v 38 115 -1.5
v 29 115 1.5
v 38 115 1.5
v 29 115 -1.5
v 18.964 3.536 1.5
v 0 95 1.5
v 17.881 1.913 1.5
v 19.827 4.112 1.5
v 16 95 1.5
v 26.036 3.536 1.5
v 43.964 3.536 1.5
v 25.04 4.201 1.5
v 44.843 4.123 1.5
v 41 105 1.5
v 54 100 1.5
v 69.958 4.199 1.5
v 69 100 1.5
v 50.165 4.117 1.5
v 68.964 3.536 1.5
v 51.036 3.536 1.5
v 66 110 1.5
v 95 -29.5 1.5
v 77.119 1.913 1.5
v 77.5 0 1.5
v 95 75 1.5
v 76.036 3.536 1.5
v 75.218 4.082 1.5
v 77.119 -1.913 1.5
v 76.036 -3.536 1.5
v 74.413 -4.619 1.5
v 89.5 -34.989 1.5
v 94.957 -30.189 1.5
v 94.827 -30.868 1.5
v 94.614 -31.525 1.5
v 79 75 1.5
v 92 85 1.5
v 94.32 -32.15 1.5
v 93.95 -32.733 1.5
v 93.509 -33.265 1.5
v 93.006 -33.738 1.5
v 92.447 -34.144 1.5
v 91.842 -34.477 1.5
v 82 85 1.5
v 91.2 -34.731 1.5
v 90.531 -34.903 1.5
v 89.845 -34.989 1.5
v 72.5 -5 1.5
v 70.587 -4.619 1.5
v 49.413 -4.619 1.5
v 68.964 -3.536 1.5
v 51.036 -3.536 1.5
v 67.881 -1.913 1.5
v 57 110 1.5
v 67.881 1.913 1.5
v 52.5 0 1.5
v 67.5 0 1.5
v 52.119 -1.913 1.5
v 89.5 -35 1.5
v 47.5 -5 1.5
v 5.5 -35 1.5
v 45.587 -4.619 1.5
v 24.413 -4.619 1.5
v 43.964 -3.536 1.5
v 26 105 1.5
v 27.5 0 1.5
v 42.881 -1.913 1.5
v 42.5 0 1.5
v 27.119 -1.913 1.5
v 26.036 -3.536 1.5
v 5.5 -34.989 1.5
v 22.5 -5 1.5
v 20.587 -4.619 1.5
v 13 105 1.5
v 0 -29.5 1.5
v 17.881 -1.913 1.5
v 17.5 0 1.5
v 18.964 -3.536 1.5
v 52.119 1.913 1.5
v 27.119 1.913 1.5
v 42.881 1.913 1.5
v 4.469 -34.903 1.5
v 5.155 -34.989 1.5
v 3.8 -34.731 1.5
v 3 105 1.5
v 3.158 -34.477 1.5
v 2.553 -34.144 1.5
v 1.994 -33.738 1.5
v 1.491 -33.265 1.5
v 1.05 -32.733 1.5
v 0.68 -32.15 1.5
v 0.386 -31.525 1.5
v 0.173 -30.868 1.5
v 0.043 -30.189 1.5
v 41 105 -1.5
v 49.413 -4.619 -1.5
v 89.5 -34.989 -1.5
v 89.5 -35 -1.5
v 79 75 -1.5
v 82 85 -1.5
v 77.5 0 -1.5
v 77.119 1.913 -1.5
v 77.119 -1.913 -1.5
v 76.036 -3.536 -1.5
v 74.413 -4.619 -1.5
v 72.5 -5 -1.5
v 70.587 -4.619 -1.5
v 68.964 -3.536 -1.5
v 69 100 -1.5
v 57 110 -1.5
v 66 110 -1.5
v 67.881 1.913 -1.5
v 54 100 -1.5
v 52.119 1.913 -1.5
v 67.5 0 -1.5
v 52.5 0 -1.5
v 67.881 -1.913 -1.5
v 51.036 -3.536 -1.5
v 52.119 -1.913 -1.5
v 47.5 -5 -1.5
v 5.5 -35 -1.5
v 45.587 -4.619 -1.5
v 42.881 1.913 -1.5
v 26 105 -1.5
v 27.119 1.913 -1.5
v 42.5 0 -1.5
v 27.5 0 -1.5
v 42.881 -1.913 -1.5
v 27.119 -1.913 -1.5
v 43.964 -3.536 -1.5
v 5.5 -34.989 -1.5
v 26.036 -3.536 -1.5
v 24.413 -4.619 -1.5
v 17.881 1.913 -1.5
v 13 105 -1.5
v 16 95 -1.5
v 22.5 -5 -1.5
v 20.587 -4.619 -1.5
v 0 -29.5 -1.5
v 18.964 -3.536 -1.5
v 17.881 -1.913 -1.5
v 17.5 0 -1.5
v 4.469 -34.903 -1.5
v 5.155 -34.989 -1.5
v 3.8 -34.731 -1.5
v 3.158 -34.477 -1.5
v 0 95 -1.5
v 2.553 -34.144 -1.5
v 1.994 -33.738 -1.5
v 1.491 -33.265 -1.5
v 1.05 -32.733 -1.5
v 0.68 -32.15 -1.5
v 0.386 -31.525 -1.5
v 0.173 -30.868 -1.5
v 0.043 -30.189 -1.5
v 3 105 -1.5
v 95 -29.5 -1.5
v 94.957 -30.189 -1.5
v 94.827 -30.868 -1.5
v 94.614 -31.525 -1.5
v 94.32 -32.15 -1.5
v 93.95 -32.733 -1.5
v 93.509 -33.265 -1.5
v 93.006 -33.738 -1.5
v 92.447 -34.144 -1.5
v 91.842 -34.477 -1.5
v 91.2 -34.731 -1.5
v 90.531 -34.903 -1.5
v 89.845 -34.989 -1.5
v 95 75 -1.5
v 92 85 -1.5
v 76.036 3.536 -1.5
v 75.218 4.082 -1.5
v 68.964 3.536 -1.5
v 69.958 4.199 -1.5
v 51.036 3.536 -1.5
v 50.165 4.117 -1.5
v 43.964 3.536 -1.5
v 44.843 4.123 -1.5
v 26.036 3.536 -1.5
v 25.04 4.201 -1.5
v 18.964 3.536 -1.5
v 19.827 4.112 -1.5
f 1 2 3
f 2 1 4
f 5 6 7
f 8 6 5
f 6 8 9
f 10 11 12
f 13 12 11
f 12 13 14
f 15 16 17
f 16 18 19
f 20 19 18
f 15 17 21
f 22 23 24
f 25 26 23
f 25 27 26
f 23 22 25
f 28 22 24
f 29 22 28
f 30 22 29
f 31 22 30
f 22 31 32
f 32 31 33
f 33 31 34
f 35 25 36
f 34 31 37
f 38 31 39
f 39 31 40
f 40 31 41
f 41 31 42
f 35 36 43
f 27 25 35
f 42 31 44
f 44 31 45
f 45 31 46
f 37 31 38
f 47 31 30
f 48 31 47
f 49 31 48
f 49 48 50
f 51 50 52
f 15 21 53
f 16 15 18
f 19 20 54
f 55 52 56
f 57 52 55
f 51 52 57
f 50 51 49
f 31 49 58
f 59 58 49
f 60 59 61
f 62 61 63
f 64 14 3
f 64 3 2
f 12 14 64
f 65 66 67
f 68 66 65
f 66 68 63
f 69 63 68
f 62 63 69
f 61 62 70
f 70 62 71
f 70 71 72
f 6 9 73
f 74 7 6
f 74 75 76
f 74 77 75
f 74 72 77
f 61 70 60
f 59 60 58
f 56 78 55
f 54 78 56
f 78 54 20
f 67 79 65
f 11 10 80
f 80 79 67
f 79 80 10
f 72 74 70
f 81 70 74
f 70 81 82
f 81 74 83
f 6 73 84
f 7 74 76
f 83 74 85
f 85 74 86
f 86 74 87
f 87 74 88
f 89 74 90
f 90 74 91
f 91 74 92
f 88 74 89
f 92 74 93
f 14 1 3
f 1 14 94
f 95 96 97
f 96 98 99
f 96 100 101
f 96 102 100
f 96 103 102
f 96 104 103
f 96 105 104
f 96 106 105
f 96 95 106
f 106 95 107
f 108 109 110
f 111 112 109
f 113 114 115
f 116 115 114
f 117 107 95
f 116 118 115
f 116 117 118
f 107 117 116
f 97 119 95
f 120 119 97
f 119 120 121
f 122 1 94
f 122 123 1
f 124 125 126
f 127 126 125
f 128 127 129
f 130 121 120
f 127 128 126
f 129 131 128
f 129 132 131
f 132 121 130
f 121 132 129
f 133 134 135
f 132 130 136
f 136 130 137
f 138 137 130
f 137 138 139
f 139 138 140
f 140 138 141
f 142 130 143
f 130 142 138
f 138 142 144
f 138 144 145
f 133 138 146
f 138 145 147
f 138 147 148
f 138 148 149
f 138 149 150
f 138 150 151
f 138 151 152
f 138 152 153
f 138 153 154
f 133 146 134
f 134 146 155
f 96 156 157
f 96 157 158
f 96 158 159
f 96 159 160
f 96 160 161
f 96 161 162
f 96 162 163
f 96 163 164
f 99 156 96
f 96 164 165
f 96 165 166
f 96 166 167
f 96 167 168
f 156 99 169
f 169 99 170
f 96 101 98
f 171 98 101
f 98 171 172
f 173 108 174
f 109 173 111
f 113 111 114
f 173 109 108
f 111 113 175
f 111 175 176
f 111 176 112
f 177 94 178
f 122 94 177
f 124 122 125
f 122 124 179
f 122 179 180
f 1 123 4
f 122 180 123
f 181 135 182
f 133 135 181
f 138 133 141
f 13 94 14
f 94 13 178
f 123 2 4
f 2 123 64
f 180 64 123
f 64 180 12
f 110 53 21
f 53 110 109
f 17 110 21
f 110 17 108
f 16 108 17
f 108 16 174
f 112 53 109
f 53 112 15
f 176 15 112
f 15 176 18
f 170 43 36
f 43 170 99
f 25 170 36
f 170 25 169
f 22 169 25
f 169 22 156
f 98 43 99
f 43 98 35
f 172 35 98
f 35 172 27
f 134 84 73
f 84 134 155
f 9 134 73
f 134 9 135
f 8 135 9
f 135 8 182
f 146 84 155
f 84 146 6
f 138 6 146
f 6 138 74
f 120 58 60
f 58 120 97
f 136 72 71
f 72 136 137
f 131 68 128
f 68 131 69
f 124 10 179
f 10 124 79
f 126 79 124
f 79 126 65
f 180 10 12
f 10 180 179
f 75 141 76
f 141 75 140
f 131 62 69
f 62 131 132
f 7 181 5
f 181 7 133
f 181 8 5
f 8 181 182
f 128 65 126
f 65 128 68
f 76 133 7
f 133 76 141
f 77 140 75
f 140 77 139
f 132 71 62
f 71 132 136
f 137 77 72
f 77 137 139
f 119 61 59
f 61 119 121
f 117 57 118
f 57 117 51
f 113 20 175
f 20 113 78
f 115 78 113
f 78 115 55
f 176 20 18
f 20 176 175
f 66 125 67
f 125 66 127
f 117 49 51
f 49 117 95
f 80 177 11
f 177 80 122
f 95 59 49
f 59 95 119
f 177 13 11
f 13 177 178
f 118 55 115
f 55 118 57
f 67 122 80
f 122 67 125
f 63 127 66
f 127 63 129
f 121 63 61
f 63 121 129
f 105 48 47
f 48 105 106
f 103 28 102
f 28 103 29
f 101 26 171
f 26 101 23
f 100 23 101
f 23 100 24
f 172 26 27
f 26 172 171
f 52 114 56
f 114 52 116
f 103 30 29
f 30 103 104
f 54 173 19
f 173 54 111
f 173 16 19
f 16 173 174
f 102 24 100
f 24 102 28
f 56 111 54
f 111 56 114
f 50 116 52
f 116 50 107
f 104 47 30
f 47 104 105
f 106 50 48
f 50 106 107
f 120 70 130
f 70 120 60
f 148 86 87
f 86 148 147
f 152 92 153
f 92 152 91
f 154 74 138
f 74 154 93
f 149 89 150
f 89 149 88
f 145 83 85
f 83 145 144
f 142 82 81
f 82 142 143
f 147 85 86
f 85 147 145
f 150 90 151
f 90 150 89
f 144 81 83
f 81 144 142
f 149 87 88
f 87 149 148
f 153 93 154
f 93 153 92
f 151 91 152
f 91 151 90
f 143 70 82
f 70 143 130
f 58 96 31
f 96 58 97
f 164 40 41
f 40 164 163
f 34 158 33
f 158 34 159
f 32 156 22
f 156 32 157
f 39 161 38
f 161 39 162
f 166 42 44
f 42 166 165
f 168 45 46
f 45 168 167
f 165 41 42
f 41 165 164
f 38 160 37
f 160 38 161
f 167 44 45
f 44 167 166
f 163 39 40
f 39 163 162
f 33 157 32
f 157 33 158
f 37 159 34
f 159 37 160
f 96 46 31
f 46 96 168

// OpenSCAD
function fingerPts(w,l, pfac,mfac) = [[-(w/2),0],[(w/2),0],[pfac*(w/2), l], [pfac*(w/2)-3, l+10], [-(mfac*(w/2)-3), l+10],[-mfac*(w/2), l] ];



module finger(width, length, t,pfac,mfac) {
    translate([width/2, 0,-t/2])
    linear_extrude(t)
    polygon(points=fingerPts(width, length, pfac, mfac));
    
}

module cornerMask(r, t){
    scale(1.1)
    difference(){
        cube([2*r,2*r,t+2], center=true);
        translate([r, r])
        cylinder(h=t+3, r=r, center=true, $fn=50);
    }
    
}

module full(fw, hl, t){
    offset = 5;
    difference() {
        union() {
            children(0);
            for (i=[1:3]){
                xval=i*(fw +offset);
                translate([xval,0,0])
                children(i);
            }
            translate([0,-hl,-(t/2)])
            cube([3*(fw+offset)+fw,hl,t]);
            if ($children ==5) {
                translate([0,-(hl+fw),0])
                rotate([0,0,45])
                children(4);
                translate([0,-(hl+fw),-2])
                rotate([0,0,45])
                cube([3*fw,2*fw,t]);
            }
        }
        
        union() {
            for (i=[1:3]){
                xval=i*(fw + offset)-offset/2;
                translate([xval,0,0])
                cylinder(h=6, r=offset, center=true);
            }
            translate([0,-hl])
            cornerMask(offset, t);
            translate([3*(fw+offset)+fw,-hl])
            rotate([0,180,0])
            cornerMask(offset, t);
            
        }
    }
    
}


full (20, 35,3){
    finger(20,95,3,0.6,1);
    finger(20,105,3,0.6,0.9);
    finger(20,100,3,0.9,0.6);
    finger(20,75,3,1,0.6);
}
